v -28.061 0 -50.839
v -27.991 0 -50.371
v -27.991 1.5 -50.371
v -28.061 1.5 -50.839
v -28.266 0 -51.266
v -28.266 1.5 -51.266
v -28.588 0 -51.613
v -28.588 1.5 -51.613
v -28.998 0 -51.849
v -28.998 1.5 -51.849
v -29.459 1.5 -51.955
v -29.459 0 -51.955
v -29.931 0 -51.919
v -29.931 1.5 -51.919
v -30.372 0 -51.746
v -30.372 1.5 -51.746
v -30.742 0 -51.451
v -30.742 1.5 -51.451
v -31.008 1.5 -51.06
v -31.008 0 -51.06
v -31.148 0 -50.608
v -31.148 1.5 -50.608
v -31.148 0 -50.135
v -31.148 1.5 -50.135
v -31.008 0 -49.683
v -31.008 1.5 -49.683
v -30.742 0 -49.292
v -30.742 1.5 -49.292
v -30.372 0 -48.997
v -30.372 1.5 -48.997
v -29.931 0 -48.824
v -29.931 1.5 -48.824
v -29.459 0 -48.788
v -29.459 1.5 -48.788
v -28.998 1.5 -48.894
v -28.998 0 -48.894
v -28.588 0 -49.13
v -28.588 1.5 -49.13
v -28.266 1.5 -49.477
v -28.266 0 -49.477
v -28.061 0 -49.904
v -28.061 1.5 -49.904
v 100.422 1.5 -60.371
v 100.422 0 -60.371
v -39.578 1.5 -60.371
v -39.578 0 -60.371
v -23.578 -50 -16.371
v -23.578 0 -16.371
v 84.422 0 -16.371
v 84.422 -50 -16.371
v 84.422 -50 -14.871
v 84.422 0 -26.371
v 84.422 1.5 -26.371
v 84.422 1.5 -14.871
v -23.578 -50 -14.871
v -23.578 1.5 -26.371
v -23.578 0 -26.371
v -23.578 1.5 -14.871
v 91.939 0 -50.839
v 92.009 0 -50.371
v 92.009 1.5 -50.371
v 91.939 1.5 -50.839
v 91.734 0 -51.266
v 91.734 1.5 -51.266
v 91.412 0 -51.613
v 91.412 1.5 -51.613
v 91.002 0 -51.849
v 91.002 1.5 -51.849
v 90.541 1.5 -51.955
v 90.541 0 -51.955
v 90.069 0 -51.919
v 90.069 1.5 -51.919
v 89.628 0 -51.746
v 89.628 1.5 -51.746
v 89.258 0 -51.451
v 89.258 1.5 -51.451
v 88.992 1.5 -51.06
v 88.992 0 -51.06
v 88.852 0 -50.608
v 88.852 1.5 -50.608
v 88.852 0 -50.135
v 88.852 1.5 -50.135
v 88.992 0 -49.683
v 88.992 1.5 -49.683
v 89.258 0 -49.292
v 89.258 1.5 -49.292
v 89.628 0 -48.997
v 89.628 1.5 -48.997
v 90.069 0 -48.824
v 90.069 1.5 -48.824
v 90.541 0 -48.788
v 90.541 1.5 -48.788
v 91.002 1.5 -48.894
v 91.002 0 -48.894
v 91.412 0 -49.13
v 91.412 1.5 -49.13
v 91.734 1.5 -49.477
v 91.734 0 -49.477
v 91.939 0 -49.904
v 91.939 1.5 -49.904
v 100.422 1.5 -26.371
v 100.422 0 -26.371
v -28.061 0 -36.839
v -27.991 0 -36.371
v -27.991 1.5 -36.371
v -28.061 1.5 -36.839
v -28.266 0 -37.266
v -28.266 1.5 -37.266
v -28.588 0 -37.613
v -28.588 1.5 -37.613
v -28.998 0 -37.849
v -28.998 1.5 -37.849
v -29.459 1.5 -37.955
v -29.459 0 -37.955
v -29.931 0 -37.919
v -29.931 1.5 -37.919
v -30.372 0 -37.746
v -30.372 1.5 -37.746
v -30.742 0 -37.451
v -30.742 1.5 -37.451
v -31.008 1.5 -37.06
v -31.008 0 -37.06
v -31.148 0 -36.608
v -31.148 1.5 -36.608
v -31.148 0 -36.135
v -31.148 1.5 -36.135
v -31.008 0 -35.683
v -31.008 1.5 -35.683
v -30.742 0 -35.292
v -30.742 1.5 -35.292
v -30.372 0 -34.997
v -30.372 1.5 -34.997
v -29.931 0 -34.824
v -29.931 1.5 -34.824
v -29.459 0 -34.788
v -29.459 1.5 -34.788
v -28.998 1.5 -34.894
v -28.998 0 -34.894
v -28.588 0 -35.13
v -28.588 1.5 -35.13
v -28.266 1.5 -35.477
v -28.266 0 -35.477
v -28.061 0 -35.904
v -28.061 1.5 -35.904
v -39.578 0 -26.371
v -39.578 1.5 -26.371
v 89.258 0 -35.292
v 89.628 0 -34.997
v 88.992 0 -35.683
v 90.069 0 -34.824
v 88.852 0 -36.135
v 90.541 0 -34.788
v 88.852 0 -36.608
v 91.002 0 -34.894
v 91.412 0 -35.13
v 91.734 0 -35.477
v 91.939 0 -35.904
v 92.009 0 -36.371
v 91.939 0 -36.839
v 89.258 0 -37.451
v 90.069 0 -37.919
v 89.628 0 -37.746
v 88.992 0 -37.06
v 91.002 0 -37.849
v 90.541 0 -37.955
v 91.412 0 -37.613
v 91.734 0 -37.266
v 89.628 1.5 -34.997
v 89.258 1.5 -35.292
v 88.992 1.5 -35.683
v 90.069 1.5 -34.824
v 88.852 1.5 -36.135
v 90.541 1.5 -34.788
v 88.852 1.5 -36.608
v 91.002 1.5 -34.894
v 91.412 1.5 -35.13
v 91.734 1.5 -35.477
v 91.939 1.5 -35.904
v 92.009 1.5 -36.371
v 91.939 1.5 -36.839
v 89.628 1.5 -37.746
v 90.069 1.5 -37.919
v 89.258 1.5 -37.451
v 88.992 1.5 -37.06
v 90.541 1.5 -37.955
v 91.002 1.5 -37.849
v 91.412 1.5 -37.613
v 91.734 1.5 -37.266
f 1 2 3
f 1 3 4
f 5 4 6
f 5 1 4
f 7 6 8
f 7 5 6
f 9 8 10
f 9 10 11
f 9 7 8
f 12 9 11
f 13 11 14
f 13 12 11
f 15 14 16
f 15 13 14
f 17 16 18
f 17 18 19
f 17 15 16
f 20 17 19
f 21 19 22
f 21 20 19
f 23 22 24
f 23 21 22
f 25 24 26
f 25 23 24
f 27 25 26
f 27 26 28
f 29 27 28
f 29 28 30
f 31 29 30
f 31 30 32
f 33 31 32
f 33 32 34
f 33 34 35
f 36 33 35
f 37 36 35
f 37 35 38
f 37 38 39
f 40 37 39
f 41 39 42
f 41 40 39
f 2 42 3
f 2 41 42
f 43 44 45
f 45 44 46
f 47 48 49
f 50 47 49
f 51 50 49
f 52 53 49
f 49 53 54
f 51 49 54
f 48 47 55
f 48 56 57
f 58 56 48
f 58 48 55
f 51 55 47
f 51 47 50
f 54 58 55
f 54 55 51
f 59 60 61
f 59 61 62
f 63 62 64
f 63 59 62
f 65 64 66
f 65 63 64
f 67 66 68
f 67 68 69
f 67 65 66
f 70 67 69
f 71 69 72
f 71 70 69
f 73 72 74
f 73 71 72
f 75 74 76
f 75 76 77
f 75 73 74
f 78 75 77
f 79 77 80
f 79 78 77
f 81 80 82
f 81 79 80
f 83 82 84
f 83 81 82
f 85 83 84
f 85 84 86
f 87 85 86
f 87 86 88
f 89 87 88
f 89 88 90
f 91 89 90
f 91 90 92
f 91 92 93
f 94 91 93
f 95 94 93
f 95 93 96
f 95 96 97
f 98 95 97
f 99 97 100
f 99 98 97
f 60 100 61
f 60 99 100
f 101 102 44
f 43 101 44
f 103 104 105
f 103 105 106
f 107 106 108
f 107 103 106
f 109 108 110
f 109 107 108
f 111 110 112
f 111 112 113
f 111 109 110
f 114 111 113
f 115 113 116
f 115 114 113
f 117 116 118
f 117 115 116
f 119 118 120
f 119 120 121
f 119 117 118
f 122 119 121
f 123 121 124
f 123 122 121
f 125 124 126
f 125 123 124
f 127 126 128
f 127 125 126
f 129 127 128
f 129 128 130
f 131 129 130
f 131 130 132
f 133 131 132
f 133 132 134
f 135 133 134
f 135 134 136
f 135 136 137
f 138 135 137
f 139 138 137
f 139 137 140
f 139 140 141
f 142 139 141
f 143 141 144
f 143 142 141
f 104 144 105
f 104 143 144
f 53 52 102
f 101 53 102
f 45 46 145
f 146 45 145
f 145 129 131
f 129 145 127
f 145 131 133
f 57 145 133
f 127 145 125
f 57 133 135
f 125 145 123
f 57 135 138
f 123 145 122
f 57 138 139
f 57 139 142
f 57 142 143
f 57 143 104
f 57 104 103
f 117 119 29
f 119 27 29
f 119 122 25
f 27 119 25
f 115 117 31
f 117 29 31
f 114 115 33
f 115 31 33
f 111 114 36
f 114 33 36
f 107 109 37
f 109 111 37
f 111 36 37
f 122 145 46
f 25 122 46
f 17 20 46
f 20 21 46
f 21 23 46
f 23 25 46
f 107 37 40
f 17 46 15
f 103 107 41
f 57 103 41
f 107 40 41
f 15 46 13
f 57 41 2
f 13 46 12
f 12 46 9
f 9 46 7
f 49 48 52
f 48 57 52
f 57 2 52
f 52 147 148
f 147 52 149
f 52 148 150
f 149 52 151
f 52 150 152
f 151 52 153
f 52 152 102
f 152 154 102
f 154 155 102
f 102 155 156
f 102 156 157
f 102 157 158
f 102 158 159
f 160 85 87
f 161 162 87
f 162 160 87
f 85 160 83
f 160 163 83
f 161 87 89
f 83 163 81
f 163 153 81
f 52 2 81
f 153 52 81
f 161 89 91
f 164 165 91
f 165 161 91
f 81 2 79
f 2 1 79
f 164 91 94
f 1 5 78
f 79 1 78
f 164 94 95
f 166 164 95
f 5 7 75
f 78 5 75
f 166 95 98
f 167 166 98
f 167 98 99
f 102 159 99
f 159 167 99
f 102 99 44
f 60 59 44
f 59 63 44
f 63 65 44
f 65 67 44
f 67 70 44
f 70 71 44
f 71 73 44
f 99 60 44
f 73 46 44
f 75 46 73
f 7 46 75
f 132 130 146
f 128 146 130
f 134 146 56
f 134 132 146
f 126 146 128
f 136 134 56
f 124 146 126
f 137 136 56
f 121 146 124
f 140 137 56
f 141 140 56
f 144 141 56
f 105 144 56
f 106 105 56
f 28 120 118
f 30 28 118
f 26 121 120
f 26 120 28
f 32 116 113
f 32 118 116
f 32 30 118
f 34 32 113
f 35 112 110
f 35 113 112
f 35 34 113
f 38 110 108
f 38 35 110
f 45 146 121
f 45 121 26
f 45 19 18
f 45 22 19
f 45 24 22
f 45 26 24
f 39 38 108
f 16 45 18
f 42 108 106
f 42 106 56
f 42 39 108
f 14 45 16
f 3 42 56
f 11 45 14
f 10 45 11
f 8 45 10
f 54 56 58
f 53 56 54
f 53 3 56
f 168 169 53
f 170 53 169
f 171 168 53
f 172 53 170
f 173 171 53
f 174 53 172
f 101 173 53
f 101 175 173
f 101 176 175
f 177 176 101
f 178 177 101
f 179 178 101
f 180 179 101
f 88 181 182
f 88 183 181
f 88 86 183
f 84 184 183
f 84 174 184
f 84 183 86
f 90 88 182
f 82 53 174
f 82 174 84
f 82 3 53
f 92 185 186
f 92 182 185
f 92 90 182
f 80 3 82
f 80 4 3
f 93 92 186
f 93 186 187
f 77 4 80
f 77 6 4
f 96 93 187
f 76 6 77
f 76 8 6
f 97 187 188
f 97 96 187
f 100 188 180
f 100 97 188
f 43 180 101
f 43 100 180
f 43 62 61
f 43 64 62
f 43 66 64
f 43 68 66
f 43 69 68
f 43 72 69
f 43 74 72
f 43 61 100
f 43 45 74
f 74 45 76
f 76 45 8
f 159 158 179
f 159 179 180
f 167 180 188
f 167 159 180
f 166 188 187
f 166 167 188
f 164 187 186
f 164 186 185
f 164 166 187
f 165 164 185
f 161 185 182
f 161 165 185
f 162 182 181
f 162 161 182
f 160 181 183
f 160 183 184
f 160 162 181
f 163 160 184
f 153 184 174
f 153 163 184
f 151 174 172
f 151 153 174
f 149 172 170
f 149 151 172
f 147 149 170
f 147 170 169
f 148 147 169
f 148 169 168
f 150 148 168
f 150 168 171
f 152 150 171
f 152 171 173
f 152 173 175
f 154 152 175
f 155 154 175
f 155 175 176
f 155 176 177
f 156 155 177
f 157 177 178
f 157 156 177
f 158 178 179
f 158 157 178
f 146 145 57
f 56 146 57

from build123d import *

# Parameters (mm, degrees)
BOSS_EXTRUDE1_OUTLINE_R = 1.5875
BOSS_EXTRUDE1_DEPTH     = 1.5
SKETCH2_W               = 108
SKETCH2_H               = 1.5
BOSS_EXTRUDE2_DEPTH     = 50


# Read off the part's stored shape, not the designer's step: Boss-Extrude1
with BuildPart() as part:
    # Boss-Extrude1 outline → Boss-Extrude1 (new body)
    with BuildSketch(Plane(origin=(0, 0, 0), x_dir=(1, 0, 0), z_dir=(0, 1, 0))):
        Polygon((84.421900247, 14.871495129), (84.421900247, 26.371495129), (100.421900247, 26.371495129), (100.421900247, 60.371495129), (-39.578099753, 60.371495129), (-39.578099753, 26.371495129), (-23.578099753, 26.371495129), (-23.578099753, 14.871495129), align=None)
        with Locations((-29.578099753, 36.371495129)):
            Circle(BOSS_EXTRUDE1_OUTLINE_R, mode=Mode.SUBTRACT)
        with Locations((90.421900247, 36.371495129)):
            Circle(BOSS_EXTRUDE1_OUTLINE_R, mode=Mode.SUBTRACT)
        with Locations((-29.578099753, 50.371495129)):
            Circle(BOSS_EXTRUDE1_OUTLINE_R, mode=Mode.SUBTRACT)
        with Locations((90.421900247, 50.371495129)):
            Circle(BOSS_EXTRUDE1_OUTLINE_R, mode=Mode.SUBTRACT)
    extrude(amount=BOSS_EXTRUDE1_DEPTH)

    # Sketch2 → Boss-Extrude2 (add)
    with BuildSketch(Plane.XZ):
        with Locations((30.421900247, -15.621495129)):
            Rectangle(SKETCH2_W, SKETCH2_H)
    extrude(amount=BOSS_EXTRUDE2_DEPTH)


solid = part.part
